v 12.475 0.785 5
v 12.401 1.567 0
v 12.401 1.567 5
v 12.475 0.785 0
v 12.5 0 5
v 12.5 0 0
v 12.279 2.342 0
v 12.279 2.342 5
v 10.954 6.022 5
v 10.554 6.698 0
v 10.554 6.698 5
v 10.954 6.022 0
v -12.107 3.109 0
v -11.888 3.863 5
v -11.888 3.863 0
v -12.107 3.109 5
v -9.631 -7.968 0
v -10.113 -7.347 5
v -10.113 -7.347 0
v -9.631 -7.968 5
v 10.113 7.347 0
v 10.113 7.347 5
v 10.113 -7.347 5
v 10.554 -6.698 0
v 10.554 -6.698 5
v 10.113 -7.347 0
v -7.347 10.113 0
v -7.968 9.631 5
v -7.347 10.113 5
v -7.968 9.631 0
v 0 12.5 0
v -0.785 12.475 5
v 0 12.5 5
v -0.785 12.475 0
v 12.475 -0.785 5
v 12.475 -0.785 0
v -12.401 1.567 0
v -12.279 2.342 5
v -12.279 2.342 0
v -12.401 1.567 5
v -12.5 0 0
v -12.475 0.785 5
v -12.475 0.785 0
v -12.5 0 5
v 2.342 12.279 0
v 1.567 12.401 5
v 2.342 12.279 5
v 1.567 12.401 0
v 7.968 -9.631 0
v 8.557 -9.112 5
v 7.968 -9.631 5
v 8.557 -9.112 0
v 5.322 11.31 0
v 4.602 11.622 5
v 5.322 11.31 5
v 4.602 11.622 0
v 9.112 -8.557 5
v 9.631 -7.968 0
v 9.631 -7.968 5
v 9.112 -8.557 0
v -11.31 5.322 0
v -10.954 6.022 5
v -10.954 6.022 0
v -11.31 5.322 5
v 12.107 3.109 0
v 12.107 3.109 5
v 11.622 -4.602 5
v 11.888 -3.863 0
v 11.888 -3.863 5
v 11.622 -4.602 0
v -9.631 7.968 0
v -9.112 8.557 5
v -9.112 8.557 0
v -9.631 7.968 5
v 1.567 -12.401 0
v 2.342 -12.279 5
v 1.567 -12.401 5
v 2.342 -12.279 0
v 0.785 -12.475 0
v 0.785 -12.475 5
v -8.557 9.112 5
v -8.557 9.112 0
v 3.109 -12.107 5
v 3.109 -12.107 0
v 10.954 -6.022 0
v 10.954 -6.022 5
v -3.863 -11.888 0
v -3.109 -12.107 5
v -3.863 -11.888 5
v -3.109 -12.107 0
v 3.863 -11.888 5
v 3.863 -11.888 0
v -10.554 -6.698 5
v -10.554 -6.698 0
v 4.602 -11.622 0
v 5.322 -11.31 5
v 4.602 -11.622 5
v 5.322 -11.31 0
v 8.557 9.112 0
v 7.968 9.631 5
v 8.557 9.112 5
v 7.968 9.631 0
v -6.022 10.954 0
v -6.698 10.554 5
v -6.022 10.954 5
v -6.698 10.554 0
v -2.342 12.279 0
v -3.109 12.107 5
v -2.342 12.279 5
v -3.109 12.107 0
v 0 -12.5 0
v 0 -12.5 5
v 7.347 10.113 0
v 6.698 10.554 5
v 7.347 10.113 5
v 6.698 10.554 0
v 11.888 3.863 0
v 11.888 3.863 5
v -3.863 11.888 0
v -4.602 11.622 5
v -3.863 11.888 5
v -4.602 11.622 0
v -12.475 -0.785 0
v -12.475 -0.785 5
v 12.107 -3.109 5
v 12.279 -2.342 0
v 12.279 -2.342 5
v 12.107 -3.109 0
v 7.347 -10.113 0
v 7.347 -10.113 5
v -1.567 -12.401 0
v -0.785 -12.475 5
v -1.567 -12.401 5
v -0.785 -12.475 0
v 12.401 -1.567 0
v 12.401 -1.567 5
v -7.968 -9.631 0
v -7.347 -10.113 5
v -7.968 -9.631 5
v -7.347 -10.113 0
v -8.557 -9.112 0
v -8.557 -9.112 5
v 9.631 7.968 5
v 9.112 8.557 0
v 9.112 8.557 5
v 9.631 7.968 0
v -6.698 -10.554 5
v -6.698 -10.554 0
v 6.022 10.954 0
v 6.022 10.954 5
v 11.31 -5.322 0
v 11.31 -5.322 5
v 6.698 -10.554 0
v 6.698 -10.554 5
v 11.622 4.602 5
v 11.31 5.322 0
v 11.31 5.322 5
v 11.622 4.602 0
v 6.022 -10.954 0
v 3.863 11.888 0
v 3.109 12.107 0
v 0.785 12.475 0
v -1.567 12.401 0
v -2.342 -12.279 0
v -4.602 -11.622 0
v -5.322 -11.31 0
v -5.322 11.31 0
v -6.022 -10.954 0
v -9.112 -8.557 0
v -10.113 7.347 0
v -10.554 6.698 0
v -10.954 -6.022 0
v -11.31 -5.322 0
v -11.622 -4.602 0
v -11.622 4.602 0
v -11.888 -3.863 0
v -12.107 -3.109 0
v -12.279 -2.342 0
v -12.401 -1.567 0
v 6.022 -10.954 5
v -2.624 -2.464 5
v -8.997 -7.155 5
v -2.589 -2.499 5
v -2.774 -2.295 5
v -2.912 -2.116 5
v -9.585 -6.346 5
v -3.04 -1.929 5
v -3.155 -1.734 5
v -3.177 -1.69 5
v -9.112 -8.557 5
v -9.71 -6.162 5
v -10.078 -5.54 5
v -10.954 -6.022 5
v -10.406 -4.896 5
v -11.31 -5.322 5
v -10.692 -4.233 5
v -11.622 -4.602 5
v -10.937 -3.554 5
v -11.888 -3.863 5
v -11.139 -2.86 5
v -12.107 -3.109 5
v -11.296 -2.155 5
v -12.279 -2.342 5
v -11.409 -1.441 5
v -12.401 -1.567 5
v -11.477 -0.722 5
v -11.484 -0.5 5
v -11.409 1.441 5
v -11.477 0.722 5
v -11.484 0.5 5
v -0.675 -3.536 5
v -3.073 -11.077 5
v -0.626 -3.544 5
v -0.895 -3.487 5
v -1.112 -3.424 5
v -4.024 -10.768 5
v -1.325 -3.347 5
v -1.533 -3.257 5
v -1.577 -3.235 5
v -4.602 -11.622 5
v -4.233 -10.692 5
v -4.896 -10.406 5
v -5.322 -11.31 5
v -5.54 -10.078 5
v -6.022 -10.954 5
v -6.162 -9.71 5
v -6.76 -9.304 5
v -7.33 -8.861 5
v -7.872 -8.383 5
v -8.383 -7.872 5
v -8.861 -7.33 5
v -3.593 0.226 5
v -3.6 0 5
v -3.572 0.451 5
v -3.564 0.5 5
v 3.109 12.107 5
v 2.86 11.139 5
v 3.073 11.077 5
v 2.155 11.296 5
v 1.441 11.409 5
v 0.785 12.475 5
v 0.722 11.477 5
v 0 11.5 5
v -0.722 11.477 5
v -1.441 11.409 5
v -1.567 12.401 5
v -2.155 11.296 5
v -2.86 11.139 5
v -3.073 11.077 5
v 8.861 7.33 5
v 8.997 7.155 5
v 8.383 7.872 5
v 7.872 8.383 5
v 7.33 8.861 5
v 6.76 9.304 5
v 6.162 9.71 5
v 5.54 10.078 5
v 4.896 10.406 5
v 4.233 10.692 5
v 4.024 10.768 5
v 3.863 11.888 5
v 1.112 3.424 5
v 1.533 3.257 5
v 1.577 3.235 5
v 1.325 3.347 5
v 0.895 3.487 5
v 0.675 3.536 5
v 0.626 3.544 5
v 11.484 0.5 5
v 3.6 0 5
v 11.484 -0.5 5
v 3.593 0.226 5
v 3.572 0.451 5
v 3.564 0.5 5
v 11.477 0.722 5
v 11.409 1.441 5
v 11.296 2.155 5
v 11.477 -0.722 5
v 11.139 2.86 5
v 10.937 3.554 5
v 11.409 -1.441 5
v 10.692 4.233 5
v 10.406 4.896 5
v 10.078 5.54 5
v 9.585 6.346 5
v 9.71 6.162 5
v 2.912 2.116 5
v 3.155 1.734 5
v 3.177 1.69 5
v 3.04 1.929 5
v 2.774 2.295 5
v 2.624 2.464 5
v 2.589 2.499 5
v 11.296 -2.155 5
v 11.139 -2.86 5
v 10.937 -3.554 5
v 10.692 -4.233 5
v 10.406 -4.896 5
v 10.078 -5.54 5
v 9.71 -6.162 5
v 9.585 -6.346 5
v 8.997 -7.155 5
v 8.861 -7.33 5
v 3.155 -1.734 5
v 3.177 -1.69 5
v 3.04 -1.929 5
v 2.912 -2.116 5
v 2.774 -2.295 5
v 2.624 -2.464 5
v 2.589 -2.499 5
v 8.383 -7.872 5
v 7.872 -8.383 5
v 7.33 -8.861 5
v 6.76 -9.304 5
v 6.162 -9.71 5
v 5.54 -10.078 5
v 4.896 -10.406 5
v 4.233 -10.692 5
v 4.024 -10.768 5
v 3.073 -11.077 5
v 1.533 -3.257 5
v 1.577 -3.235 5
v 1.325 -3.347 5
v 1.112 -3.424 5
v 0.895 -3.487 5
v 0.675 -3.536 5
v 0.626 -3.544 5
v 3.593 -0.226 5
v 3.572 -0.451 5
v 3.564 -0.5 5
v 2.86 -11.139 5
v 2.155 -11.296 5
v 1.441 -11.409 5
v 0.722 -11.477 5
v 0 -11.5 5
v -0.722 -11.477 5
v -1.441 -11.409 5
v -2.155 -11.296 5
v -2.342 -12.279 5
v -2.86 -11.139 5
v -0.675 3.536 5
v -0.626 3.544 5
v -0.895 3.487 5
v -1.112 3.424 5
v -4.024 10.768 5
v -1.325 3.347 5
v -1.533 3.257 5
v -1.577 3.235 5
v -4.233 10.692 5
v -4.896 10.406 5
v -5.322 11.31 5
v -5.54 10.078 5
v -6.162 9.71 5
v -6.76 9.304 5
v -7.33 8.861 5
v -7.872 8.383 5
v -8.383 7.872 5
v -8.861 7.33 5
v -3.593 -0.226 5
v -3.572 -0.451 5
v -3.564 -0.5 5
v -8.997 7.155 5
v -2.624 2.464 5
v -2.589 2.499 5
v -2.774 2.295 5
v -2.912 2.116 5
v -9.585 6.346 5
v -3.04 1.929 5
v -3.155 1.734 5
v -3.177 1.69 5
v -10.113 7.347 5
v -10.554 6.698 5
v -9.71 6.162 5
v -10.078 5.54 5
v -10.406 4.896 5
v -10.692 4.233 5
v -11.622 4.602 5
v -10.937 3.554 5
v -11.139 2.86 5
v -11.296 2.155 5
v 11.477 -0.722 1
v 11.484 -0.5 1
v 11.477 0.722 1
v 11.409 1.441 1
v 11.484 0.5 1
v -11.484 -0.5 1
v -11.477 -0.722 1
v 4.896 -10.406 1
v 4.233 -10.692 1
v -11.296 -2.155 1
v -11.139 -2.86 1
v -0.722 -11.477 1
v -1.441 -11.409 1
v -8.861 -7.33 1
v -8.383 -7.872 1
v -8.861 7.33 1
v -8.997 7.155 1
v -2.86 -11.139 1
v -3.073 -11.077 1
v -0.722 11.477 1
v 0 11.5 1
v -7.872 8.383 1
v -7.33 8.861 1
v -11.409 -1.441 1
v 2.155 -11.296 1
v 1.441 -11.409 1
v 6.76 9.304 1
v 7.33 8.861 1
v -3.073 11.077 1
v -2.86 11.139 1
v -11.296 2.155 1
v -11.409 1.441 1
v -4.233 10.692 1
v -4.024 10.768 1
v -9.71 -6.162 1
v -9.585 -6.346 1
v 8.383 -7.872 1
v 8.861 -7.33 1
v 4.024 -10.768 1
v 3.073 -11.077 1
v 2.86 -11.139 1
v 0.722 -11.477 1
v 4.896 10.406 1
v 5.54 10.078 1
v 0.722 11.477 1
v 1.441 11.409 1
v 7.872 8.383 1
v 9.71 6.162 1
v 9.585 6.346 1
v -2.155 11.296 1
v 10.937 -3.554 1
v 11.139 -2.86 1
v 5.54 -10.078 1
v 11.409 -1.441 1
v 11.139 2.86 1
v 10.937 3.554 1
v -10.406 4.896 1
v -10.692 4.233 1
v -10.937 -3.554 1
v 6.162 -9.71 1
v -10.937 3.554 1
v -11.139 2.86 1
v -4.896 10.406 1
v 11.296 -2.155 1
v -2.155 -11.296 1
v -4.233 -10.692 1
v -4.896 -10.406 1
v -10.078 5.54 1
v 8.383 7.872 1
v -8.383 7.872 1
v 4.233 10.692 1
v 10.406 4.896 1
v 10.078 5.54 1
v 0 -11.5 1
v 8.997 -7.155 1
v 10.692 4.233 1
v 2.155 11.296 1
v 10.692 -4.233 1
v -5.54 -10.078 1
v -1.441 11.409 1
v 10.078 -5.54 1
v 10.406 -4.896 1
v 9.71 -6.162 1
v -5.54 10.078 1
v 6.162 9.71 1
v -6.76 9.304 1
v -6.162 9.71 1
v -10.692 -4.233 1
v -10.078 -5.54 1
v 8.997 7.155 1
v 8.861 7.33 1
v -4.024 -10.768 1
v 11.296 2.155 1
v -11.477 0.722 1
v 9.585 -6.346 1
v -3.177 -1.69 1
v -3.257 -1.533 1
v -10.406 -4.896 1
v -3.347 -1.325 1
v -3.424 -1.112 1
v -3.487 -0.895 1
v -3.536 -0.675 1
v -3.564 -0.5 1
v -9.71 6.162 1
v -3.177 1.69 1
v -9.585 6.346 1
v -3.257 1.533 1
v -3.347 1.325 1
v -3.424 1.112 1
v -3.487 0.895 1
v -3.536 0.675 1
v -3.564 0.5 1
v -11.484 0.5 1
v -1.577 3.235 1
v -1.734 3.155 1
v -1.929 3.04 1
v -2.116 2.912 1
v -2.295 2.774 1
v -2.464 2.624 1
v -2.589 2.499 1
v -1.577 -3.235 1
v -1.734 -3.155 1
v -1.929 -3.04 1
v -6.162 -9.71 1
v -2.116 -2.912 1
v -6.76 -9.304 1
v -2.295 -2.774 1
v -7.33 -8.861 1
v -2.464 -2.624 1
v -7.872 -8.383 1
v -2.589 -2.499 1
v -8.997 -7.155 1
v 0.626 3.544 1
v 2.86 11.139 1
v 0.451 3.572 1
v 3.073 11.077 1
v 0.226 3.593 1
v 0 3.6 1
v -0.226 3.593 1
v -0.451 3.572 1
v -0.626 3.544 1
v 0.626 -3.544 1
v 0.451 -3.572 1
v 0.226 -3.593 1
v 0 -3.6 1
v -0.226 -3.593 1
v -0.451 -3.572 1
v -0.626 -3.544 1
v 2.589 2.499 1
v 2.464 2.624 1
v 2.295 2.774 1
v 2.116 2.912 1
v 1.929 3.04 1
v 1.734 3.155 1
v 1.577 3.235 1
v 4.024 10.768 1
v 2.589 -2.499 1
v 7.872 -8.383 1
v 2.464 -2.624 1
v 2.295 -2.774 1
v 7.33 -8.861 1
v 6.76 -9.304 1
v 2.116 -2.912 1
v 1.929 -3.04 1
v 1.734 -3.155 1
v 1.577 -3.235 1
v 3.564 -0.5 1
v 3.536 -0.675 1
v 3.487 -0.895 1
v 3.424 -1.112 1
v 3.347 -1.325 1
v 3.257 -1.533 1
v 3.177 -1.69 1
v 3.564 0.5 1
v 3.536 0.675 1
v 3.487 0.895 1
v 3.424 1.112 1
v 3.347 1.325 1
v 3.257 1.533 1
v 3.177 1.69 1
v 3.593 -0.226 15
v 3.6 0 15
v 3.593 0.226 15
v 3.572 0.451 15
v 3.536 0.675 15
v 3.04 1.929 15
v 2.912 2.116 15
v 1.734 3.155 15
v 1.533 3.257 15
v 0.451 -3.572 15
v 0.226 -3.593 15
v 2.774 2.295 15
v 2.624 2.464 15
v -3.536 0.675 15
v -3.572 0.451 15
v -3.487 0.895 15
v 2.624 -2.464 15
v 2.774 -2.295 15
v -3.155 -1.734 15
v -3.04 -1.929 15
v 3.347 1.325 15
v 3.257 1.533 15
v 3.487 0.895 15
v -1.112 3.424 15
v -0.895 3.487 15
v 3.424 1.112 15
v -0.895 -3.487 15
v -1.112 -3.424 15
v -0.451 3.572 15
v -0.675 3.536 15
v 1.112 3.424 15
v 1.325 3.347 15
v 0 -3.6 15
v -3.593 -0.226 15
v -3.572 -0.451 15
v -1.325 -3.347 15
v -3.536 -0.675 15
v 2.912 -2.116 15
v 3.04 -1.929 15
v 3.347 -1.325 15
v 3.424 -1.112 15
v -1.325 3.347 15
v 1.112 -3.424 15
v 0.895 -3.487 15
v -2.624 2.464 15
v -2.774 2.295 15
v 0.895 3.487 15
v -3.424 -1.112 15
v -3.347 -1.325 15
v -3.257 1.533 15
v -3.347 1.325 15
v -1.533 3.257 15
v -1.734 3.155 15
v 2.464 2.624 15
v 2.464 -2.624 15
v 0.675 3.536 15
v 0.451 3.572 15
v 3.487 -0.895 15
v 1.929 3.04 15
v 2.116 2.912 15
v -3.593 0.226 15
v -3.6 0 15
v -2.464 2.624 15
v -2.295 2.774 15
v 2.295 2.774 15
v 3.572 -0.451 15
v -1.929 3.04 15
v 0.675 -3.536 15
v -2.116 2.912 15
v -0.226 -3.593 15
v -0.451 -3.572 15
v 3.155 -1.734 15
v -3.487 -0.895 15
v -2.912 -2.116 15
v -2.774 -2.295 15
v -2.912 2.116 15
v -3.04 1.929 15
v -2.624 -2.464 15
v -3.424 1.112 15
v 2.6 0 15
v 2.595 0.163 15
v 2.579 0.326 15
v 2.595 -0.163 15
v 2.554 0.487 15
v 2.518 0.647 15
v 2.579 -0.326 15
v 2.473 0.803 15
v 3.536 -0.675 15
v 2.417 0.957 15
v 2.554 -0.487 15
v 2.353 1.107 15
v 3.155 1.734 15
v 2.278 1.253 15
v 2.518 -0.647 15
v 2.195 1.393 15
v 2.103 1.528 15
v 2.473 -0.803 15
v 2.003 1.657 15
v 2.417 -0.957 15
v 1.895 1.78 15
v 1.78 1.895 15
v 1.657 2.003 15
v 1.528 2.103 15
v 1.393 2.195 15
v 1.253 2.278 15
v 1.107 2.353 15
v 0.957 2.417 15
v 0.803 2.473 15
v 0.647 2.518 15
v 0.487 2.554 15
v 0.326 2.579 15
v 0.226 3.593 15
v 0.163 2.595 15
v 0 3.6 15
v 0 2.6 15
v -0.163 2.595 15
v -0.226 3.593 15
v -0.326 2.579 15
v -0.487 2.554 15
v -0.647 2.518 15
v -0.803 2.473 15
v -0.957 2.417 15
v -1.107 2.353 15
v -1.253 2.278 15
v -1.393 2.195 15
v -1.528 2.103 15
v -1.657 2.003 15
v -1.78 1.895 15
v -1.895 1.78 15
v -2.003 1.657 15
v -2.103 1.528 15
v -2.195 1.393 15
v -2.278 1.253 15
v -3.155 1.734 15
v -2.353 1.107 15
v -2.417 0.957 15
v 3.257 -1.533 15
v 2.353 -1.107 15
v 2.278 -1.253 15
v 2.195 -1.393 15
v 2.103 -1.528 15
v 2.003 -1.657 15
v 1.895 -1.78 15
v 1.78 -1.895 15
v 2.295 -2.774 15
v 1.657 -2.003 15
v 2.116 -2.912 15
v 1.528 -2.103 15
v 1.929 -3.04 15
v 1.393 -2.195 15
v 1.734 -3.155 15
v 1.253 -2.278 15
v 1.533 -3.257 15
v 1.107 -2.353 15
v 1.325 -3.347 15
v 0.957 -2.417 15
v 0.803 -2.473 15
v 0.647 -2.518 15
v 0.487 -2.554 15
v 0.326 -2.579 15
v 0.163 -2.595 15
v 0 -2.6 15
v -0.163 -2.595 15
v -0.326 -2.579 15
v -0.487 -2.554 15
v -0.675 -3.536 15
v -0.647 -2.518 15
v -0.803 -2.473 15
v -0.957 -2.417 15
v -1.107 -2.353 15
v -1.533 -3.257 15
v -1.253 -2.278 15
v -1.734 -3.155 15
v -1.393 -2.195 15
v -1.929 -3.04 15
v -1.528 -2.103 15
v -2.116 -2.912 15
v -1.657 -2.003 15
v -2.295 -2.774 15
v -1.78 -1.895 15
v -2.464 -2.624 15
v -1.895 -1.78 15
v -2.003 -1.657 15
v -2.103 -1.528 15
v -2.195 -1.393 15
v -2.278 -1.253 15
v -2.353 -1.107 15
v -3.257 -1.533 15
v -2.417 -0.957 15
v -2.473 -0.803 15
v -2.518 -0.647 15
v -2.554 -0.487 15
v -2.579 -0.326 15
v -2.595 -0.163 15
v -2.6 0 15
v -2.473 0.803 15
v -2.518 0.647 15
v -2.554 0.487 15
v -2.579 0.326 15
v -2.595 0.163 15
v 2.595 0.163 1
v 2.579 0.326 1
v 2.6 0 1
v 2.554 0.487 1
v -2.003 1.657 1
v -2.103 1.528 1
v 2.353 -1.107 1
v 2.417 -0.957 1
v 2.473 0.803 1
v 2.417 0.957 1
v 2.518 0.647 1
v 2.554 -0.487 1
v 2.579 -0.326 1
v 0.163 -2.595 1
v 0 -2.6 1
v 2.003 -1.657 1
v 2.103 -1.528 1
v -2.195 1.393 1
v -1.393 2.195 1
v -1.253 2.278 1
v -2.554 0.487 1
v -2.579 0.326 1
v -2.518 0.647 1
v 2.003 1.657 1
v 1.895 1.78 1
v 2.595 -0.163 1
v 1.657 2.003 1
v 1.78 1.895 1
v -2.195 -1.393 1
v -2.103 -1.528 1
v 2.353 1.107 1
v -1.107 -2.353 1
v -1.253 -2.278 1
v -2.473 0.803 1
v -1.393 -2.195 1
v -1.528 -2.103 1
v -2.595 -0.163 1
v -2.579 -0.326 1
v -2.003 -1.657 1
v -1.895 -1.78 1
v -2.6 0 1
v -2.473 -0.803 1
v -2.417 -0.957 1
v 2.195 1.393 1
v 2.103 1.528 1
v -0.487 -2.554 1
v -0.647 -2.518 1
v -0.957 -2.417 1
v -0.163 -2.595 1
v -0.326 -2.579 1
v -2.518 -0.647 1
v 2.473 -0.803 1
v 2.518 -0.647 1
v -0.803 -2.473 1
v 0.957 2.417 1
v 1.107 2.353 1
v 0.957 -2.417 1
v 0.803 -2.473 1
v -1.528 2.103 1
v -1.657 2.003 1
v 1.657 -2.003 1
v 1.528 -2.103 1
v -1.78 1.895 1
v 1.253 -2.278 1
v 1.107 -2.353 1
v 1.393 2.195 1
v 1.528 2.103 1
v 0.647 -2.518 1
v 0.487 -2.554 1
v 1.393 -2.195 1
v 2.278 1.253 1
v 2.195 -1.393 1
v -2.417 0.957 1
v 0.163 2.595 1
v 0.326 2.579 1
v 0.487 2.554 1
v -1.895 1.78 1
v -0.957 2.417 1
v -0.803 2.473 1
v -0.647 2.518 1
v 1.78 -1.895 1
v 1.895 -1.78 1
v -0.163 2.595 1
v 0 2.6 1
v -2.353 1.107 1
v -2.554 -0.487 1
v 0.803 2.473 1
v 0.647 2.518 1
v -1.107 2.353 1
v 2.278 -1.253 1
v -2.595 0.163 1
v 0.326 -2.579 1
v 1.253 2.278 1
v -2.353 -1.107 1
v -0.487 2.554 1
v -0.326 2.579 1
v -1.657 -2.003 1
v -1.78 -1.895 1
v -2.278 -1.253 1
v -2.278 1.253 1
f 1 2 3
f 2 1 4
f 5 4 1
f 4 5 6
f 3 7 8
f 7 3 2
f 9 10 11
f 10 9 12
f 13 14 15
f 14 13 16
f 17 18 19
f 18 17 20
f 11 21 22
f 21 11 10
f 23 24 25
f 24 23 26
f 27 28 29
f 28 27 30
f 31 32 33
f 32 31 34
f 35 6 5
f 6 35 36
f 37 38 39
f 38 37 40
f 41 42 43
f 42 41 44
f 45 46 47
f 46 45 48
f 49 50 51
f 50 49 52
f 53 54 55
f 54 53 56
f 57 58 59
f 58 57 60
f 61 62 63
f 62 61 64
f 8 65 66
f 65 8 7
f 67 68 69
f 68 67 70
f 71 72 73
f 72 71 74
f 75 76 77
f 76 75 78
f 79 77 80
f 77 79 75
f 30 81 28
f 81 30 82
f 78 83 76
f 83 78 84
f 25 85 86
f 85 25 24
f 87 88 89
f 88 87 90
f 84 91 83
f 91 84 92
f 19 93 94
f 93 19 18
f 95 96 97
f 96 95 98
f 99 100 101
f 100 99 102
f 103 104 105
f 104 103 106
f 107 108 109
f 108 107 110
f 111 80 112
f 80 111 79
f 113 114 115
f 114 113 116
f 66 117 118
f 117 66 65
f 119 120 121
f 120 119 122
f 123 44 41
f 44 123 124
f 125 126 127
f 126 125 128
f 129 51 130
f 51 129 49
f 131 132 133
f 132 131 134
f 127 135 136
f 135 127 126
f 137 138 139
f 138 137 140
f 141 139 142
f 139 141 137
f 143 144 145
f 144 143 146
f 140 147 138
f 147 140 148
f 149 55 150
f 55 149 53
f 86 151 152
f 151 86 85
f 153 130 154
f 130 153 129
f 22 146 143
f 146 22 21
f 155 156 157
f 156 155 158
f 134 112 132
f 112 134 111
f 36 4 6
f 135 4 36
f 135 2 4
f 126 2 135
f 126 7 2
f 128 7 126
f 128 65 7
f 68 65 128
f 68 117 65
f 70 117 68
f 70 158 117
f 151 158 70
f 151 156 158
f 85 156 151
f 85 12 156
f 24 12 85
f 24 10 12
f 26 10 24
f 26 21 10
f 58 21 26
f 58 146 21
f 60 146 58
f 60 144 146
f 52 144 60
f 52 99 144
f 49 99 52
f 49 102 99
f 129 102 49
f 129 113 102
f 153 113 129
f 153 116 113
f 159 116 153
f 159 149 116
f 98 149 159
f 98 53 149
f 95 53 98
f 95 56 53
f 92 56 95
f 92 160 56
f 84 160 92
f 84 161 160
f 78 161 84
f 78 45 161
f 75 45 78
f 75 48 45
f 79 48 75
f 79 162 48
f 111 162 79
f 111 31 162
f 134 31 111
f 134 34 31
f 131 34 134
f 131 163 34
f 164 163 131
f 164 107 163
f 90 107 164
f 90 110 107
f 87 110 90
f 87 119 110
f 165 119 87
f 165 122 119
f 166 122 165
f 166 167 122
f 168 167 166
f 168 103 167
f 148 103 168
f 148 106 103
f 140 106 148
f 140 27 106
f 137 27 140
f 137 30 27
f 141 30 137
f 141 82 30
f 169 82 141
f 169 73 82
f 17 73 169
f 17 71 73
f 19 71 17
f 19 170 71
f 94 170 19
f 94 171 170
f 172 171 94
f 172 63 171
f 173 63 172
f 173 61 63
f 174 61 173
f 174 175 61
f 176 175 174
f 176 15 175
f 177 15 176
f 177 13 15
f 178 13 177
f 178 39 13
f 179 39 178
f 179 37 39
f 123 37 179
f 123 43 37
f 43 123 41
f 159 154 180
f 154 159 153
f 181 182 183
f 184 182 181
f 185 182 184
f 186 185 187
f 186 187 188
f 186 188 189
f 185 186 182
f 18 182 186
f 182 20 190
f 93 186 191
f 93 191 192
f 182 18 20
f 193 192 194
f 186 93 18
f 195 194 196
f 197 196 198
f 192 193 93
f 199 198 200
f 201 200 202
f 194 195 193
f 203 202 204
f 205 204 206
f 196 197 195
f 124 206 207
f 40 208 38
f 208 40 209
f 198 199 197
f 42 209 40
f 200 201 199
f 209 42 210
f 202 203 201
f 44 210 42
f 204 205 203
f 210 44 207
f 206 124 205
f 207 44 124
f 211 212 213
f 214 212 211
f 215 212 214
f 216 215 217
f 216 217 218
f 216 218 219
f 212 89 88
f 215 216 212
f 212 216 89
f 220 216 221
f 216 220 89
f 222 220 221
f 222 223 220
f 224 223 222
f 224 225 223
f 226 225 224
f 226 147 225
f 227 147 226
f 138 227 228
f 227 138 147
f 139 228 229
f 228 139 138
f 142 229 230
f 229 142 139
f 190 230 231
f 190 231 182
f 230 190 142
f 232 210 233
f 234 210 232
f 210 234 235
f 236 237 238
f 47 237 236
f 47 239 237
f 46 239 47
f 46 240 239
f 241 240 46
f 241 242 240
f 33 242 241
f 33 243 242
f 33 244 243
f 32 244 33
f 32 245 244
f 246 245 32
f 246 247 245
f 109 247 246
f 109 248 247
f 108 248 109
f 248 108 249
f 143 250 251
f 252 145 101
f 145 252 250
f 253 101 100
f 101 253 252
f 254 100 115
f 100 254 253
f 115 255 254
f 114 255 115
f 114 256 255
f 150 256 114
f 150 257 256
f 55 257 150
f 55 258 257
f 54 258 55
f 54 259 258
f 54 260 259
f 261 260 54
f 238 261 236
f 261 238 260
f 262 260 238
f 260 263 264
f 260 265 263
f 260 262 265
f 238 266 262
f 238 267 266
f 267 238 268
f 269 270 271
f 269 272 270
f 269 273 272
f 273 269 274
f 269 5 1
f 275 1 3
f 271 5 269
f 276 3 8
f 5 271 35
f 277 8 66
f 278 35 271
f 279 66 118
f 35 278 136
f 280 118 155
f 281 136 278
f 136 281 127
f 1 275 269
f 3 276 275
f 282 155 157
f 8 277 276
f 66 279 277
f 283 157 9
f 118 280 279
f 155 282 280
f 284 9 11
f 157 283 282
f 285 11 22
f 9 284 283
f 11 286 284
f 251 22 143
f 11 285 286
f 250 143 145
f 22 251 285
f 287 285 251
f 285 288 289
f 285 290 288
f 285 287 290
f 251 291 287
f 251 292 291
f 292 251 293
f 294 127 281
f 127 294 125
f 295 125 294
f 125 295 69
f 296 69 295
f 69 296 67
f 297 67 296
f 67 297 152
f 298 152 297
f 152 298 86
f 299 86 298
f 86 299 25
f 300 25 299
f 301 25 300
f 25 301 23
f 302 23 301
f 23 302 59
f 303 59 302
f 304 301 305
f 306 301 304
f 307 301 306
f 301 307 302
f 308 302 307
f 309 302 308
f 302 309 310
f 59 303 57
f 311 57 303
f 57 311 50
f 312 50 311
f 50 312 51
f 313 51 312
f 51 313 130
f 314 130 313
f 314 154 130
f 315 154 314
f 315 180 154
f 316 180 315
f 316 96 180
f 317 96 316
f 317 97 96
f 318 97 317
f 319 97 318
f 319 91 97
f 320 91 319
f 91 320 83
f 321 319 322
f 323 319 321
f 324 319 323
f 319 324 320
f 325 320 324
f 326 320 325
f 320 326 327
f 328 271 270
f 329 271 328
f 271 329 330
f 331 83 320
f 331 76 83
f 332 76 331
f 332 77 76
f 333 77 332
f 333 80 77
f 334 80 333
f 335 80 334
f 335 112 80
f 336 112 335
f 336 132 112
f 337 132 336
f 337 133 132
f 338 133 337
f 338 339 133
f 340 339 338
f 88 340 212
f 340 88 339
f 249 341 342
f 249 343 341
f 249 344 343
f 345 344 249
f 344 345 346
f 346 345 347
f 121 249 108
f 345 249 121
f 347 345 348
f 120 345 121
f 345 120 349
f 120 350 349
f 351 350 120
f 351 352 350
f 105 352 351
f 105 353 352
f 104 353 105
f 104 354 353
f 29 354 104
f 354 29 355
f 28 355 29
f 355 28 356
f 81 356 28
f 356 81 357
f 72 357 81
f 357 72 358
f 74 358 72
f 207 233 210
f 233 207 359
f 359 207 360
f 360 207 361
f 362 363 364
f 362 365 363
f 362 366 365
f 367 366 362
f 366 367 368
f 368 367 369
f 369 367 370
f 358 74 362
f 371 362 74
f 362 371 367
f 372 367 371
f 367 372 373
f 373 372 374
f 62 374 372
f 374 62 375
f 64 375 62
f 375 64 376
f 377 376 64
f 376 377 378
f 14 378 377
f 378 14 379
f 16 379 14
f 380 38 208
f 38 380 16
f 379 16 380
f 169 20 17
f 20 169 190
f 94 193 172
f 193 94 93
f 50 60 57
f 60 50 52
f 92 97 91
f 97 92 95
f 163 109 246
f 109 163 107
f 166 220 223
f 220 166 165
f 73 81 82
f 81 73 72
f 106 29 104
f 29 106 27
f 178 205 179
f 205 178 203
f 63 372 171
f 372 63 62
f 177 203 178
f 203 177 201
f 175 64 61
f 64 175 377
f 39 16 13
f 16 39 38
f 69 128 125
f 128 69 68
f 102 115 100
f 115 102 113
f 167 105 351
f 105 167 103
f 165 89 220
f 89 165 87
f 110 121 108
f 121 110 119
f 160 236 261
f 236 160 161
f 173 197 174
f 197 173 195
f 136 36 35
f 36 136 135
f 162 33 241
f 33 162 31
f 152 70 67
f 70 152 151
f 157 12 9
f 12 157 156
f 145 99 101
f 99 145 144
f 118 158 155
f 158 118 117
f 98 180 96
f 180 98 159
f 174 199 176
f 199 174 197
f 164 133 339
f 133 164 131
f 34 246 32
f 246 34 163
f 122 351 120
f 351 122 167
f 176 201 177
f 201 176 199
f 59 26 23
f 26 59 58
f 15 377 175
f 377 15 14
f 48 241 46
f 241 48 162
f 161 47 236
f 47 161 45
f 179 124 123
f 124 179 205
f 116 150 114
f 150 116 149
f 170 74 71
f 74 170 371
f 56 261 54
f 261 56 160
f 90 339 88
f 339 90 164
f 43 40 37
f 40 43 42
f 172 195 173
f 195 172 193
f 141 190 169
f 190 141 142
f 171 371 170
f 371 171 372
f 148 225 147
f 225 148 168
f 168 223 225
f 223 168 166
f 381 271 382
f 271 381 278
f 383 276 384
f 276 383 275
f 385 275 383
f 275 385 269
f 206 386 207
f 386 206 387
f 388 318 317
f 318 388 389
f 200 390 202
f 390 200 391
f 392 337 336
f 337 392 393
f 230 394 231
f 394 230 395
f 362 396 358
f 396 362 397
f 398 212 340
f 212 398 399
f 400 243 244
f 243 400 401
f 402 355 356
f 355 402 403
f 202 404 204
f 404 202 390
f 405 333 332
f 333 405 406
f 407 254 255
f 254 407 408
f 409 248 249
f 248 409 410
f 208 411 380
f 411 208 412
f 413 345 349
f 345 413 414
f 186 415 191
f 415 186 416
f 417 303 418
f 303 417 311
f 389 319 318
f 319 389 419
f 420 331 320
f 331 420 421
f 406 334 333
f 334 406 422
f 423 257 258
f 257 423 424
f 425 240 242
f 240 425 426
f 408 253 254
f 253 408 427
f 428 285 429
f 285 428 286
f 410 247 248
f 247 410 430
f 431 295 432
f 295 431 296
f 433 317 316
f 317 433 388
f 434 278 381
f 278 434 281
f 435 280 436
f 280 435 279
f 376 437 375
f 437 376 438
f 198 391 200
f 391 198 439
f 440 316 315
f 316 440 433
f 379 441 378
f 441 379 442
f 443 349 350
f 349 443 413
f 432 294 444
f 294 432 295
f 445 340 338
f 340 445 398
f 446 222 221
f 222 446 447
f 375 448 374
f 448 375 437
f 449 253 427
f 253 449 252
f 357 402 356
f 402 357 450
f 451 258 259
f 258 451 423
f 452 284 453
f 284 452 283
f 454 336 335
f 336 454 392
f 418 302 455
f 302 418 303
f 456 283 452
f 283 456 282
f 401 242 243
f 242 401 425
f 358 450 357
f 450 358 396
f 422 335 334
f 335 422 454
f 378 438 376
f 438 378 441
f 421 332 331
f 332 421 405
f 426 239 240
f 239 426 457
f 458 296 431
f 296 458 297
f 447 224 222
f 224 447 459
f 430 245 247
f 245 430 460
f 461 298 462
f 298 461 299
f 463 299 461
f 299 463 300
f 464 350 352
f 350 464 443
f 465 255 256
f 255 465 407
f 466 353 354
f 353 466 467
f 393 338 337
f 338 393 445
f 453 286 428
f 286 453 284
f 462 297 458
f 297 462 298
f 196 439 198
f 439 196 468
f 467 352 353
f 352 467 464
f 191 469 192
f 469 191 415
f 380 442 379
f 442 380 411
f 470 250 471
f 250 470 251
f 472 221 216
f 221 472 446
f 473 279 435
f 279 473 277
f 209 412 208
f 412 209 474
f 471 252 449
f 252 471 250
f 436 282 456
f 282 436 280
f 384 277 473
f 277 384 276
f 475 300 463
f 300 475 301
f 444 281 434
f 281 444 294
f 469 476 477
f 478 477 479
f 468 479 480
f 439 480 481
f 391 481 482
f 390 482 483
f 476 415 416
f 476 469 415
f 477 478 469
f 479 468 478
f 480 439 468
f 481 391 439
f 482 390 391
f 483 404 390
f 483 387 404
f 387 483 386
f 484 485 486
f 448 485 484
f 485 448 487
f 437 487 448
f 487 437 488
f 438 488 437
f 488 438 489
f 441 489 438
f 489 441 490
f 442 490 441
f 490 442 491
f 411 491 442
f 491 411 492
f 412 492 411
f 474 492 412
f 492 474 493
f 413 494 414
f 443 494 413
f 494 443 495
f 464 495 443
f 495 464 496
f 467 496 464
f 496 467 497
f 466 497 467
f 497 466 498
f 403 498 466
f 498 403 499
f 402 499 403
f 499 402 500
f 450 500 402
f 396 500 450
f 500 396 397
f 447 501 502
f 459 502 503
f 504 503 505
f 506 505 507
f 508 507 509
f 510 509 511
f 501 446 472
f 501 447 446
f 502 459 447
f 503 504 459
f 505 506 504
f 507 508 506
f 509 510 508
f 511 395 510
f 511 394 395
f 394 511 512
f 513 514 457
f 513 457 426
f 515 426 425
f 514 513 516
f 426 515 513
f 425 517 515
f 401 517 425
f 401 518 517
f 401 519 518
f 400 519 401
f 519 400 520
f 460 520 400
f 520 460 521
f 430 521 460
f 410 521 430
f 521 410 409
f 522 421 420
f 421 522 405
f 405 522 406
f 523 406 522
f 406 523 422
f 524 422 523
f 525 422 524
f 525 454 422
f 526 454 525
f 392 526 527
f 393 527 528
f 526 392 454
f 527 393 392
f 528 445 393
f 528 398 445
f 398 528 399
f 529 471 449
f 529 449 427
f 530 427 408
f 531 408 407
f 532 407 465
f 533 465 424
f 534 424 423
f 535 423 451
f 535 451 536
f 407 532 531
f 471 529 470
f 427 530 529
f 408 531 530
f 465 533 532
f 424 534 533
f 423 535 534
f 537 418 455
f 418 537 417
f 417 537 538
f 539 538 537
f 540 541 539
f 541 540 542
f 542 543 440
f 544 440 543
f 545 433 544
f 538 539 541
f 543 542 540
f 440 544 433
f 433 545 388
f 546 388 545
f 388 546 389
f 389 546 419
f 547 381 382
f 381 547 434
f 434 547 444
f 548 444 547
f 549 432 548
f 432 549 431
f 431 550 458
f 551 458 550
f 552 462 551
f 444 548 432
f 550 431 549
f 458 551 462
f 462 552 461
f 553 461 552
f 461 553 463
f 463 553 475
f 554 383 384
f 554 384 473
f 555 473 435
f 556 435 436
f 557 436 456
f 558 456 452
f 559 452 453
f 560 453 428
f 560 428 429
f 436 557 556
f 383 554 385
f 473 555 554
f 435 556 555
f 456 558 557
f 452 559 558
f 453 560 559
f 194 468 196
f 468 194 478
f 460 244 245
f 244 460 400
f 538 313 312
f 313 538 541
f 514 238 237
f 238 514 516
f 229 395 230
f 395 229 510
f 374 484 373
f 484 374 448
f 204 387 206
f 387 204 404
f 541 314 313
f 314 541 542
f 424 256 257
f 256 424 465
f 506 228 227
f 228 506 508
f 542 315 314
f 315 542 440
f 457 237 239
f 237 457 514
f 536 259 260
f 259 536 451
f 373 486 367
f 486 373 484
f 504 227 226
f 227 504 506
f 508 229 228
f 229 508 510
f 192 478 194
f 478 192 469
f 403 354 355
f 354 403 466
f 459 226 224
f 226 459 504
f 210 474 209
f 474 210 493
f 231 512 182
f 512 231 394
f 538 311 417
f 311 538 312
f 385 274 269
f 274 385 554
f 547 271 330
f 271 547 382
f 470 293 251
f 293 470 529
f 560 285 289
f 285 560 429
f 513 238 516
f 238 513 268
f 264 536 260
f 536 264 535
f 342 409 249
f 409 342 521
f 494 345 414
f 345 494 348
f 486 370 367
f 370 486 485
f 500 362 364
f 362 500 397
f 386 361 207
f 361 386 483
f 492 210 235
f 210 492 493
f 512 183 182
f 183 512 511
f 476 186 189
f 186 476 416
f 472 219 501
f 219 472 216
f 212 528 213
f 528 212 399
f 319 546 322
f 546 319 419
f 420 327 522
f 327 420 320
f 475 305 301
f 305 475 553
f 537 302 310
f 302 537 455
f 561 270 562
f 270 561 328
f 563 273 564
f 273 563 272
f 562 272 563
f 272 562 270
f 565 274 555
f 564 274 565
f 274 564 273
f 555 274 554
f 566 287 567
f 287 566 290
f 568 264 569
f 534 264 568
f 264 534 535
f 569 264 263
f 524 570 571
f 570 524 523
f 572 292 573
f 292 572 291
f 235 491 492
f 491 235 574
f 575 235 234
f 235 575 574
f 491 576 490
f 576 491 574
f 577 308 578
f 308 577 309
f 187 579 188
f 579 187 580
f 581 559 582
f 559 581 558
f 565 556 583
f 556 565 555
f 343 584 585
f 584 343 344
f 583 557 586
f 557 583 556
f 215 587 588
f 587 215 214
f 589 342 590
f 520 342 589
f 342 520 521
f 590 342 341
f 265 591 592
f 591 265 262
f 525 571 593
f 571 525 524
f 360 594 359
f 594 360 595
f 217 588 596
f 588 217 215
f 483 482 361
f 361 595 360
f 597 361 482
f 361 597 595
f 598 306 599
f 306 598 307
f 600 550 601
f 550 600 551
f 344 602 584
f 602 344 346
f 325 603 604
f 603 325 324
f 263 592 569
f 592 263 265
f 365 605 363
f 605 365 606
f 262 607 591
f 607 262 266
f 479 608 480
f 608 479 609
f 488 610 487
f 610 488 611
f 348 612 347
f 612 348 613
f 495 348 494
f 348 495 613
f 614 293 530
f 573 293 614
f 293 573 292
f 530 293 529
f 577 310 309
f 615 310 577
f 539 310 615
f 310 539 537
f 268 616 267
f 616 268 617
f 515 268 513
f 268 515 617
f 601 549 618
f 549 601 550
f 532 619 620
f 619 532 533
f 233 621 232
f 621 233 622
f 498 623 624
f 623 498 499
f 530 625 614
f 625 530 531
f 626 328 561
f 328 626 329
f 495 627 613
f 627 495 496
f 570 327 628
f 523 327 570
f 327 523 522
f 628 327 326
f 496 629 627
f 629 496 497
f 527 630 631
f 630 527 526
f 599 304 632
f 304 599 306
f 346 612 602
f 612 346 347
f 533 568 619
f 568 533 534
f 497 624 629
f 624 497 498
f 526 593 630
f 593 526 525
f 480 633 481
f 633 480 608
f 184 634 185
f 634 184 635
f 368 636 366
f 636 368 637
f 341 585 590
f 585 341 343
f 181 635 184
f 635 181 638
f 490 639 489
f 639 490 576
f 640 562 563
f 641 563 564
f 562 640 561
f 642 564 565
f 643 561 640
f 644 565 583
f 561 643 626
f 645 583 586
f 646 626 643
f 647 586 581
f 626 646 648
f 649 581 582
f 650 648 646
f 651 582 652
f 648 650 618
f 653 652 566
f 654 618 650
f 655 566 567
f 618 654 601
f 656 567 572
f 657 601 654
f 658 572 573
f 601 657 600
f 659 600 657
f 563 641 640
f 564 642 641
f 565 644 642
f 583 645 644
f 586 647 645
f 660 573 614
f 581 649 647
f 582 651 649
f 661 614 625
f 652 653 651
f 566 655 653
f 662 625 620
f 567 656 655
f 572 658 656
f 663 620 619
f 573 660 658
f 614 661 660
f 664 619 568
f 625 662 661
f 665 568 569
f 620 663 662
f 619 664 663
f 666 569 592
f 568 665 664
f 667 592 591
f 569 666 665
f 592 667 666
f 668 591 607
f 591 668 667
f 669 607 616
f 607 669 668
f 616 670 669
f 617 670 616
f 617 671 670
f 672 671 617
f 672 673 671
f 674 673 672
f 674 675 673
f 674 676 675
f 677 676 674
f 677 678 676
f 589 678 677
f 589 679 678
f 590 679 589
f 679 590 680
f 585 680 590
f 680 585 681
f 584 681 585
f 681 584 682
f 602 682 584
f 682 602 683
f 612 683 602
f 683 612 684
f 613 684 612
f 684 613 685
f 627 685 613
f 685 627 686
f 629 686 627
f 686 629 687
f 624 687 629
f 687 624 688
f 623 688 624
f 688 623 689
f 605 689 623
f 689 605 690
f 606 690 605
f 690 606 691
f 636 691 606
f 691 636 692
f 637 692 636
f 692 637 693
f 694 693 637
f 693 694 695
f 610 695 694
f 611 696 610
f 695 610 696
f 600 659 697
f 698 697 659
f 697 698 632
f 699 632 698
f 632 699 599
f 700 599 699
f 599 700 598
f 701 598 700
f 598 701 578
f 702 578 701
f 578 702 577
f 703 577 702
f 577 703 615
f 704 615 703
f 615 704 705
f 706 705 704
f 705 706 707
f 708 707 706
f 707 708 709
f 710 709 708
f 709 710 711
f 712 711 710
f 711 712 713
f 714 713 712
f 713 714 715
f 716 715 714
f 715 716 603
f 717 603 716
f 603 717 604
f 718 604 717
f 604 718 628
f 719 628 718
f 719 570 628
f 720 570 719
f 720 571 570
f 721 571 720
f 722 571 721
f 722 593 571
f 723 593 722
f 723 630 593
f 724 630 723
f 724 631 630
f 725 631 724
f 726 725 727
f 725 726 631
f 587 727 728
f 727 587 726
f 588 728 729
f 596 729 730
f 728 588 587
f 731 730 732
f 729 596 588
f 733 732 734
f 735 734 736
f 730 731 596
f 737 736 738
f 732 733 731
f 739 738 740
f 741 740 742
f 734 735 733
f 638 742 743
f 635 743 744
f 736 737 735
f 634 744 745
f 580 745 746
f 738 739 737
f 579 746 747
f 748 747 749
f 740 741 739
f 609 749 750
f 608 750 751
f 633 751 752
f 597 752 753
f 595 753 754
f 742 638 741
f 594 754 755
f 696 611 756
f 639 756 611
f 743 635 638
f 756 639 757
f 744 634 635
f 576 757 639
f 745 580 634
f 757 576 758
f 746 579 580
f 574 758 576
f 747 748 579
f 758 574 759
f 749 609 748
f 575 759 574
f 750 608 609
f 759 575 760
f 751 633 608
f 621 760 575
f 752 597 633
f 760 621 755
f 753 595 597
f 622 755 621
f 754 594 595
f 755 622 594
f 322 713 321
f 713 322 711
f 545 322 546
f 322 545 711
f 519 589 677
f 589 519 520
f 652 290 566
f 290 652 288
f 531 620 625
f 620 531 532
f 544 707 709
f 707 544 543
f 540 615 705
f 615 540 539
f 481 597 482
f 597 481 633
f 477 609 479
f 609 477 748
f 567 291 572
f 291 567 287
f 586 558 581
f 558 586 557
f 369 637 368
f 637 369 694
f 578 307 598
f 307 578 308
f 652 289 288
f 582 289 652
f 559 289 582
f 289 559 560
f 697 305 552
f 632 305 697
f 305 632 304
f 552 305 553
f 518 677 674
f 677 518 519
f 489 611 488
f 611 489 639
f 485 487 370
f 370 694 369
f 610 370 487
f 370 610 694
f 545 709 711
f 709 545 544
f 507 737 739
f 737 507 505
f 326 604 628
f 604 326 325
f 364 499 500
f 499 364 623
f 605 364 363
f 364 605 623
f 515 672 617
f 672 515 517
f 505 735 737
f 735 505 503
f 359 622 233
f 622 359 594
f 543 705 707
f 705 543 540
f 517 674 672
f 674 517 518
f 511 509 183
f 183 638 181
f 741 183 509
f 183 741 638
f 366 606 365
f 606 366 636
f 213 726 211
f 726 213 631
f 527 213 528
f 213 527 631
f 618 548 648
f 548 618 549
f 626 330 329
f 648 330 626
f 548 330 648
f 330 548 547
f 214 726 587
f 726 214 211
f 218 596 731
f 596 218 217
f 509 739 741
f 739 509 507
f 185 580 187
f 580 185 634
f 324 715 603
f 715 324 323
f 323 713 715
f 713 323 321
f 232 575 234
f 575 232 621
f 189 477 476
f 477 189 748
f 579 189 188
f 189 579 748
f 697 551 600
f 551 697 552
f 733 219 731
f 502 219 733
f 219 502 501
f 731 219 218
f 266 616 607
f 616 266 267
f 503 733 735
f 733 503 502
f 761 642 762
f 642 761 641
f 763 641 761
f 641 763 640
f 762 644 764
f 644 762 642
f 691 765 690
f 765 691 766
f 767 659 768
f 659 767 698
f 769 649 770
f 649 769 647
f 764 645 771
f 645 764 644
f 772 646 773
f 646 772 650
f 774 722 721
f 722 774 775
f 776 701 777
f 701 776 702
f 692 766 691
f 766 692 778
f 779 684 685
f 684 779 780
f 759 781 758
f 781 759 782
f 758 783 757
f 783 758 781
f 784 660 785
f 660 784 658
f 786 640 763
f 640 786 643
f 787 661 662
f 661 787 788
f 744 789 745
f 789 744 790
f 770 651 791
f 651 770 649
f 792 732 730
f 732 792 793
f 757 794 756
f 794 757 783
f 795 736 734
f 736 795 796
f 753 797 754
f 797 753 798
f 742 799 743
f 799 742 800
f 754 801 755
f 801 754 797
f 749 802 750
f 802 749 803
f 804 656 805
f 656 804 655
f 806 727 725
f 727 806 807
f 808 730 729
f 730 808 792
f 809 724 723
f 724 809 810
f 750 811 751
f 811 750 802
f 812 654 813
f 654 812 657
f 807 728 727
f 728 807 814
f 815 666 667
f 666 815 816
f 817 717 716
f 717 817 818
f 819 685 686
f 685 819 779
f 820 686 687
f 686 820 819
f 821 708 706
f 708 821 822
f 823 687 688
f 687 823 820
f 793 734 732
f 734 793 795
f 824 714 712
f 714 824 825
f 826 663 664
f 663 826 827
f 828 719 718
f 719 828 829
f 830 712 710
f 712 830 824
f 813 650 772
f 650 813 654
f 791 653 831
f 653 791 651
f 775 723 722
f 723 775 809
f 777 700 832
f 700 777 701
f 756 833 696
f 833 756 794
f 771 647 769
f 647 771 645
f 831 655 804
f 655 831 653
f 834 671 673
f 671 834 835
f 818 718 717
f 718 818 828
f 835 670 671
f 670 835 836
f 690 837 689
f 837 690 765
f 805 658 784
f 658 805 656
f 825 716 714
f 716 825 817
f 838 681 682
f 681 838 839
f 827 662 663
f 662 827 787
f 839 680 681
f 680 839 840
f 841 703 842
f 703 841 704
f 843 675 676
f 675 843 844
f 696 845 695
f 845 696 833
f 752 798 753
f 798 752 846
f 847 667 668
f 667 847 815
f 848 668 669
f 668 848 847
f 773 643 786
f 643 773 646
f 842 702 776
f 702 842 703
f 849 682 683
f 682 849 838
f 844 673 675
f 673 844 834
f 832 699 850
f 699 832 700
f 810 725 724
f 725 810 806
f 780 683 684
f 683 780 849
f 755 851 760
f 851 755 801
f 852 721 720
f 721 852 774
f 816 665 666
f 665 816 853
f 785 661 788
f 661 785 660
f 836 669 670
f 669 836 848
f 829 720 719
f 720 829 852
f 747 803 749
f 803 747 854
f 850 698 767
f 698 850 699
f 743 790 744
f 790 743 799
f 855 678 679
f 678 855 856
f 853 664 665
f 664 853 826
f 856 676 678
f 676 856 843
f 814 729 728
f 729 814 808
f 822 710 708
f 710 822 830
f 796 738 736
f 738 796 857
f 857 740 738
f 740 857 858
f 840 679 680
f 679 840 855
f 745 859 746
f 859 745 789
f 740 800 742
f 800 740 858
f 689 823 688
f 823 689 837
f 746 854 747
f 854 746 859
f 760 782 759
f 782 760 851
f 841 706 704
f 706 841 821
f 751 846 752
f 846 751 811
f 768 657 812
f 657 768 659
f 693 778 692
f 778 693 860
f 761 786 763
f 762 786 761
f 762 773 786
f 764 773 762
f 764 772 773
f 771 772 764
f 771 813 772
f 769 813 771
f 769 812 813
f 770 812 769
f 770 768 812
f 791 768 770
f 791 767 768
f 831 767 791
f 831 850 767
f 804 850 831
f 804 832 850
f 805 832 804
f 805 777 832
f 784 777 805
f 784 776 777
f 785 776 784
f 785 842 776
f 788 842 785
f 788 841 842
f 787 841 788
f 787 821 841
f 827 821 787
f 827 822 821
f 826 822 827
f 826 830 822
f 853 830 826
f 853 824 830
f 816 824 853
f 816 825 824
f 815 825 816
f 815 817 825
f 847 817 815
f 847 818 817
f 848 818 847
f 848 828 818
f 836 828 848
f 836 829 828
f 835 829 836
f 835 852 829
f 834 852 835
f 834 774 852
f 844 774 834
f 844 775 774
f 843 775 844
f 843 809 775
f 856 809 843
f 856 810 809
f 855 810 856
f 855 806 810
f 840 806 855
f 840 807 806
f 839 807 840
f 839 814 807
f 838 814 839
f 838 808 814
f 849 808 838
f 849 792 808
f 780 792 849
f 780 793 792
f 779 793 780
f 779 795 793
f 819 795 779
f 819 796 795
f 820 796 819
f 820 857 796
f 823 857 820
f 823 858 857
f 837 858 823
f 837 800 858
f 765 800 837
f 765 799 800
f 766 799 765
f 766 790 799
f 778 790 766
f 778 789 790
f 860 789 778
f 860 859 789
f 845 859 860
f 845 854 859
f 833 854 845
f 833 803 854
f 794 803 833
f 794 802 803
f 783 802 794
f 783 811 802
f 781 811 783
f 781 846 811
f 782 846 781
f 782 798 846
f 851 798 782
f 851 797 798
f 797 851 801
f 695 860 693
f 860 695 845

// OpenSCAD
//Pinball style star LED insert
$fn=100;
//You can adjust the variables below
size=25;        //diameter of insert in mm
depth=5;        //depth of insert
face=1;         //thickness of front face
led=5.2;          //diameter of LED
stem=15;    //length of LED stem
//don't adjust anything below here
difference(){
union(){
difference(){
union(){
//main disk
cylinder(h=depth, d=size);
}
//internal cylinder
translate([0,0,face])  
cylinder(h=depth,d=size-2);
}
//star fins
for (i=[0:36:350])rotate([0, 0, i]){
translate([0,-.5,face])
cube([(size/2)-1,1,depth-face]);
}
//LED pillar
cylinder(h=stem,d=led+2);
}
//led hole
translate([0,0,face])  
cylinder(h=stem+1,d=led);
}
